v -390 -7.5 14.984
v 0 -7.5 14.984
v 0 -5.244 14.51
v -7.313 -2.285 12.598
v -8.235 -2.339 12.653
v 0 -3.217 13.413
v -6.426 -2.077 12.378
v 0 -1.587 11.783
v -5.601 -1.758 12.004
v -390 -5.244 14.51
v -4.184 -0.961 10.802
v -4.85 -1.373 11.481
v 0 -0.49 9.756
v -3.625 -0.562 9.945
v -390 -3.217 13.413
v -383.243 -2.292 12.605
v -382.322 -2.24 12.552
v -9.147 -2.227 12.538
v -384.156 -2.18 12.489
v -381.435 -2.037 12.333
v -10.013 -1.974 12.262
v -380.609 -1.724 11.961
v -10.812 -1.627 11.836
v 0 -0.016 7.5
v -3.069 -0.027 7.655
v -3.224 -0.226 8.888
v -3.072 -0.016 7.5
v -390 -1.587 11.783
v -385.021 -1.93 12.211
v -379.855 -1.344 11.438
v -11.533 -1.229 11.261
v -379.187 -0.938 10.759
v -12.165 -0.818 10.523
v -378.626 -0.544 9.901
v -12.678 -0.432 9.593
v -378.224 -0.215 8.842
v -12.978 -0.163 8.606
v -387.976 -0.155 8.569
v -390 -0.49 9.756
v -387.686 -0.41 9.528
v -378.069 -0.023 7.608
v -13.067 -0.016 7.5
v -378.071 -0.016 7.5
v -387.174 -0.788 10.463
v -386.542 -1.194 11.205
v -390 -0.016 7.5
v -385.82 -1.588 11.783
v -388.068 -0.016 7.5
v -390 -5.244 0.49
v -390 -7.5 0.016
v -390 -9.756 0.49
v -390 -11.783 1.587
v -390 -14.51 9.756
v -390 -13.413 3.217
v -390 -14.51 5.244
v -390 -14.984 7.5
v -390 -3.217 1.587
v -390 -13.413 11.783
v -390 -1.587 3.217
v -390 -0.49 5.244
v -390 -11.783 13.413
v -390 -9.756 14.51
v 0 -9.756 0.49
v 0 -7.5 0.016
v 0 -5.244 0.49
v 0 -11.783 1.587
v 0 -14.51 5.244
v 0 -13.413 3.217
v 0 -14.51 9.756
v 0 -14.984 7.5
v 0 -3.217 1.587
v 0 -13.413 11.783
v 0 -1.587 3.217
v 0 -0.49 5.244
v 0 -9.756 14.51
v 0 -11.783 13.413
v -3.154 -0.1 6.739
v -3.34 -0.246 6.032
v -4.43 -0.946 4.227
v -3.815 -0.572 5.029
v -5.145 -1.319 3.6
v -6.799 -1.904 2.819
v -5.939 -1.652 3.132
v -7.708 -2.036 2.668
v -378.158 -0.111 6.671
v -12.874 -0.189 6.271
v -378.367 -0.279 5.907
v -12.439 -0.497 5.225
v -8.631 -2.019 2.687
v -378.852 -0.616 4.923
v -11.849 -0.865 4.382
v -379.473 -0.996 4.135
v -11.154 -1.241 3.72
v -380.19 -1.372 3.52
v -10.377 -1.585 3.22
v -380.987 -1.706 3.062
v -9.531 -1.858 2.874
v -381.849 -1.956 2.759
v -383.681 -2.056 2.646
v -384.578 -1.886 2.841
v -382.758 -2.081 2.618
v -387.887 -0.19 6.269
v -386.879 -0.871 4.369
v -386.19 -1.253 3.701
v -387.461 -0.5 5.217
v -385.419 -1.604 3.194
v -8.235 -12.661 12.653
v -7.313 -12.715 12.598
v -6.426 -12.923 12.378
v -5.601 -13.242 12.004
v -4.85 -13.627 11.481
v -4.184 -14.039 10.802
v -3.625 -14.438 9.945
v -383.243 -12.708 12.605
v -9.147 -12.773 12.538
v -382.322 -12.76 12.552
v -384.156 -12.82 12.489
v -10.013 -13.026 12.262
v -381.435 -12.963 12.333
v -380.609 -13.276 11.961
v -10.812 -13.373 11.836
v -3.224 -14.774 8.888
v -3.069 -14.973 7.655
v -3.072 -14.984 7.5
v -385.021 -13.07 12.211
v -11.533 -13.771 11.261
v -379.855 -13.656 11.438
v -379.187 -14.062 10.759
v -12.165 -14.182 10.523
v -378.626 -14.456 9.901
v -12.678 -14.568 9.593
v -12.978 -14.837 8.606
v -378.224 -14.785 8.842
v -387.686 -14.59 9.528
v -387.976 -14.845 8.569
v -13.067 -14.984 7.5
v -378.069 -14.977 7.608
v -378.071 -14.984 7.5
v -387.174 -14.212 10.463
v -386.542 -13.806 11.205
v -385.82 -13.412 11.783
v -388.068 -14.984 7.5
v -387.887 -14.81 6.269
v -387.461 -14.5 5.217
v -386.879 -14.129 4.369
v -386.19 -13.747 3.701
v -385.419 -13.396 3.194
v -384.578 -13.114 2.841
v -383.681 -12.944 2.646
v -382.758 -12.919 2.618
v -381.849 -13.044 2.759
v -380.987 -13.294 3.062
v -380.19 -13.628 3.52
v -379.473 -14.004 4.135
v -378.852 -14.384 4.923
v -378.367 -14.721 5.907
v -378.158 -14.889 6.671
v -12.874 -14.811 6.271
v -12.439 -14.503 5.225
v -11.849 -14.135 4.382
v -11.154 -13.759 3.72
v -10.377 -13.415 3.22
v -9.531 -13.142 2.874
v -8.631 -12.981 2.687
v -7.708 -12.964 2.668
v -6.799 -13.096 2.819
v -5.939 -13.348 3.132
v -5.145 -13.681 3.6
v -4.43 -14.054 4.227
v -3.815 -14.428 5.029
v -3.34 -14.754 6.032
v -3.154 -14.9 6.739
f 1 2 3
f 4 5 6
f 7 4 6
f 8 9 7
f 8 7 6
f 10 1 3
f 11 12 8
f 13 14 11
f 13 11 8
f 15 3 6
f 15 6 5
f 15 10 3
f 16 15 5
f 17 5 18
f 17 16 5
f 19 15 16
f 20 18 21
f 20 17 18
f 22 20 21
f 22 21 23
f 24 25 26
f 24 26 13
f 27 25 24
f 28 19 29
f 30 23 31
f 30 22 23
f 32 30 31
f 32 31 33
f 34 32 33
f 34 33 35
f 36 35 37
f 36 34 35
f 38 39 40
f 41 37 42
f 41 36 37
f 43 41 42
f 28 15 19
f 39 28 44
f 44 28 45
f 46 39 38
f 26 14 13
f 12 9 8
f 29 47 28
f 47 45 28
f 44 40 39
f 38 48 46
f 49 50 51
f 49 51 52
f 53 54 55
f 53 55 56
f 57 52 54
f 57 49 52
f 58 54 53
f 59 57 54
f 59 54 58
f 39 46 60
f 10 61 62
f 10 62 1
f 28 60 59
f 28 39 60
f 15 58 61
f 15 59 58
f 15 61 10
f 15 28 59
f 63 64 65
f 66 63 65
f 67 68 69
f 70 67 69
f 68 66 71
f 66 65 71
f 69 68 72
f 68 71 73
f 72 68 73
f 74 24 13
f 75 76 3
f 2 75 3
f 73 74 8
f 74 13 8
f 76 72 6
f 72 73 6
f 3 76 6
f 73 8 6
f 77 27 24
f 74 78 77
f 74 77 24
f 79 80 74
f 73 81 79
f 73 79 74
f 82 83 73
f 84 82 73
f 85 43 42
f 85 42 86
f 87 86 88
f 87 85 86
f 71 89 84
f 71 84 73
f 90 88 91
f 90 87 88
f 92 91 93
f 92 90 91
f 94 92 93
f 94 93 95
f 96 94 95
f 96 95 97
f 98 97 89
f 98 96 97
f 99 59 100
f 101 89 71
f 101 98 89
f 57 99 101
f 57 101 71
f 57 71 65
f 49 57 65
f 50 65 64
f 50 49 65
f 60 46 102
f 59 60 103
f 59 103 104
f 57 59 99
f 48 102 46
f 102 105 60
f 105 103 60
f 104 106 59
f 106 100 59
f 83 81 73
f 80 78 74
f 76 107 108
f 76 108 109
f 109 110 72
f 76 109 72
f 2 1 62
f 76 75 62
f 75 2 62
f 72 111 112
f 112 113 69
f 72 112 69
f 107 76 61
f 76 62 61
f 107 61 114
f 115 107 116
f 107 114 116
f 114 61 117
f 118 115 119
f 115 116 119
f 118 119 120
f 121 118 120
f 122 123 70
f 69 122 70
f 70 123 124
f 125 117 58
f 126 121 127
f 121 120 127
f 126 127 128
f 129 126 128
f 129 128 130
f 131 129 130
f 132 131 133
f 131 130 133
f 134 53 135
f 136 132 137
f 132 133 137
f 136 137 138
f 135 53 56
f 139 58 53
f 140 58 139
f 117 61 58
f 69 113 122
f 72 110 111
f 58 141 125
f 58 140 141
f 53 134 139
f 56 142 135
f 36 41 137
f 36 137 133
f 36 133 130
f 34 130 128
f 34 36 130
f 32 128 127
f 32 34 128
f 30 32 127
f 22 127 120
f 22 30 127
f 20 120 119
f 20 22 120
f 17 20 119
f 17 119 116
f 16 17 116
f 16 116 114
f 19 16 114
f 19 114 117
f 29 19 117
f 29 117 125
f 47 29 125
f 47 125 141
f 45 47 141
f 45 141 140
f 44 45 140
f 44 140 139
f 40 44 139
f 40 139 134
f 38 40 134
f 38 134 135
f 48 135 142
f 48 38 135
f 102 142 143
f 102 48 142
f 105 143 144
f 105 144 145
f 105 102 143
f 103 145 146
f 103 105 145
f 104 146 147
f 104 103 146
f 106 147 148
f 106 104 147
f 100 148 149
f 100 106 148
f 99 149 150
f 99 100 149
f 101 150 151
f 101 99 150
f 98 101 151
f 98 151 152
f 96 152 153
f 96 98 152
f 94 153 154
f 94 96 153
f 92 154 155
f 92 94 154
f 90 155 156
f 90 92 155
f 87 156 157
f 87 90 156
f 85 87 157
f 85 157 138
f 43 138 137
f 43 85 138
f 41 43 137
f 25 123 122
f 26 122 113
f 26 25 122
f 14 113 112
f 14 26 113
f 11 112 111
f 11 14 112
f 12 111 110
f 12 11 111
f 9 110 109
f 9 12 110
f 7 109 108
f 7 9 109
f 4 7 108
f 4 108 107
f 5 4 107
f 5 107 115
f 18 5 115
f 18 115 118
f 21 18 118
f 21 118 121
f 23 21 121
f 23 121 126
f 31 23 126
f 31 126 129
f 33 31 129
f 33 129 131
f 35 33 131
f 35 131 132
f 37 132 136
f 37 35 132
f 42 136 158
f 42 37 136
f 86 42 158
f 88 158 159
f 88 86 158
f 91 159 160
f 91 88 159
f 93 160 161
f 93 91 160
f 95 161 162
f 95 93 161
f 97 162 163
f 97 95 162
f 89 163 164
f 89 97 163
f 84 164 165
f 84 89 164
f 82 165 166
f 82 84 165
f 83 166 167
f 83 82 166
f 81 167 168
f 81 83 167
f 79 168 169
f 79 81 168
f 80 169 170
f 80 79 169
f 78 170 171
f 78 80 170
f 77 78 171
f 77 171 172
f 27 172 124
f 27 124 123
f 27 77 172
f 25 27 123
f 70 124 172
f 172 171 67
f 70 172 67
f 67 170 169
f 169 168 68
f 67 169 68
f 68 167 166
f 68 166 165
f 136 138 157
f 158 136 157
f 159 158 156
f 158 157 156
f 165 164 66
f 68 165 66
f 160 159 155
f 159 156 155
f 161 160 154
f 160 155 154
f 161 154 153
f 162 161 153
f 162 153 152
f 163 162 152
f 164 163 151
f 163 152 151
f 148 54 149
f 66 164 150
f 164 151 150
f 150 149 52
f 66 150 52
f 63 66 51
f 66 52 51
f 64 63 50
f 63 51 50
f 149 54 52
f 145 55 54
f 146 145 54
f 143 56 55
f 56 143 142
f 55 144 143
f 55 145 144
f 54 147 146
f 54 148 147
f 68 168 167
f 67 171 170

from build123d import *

# Parameters (mm, degrees)
F0_W        = 390
F0_H        = 15
F1_DEPTH    = 15
F2_R        = 5
F3_DEPTH    = 20
F4_T1_DEPTH = 430


# Not quite as in the source:
# - a fillet or chamfer that OpenCascade refuses, or shapes differently, is made with other operations: its cross-section is extruded or revolved along the edge and cut away or added


with BuildPart() as f1:
    # F0 (on Front) → F1 (new body)
    with BuildSketch(Plane.XZ):
        with Locations((-195, 7.5)):
            Rectangle(F0_W, F0_H)
    extrude(amount=F1_DEPTH)

    # F2 (on Front) → F3 (cut)
    with BuildSketch(Plane.XZ):
        with Locations((-383.0693596974, 7.6079843566)):
            Circle(F2_R)
        with Locations((-8.0693596974, 7.6553751715)):
            Circle(F2_R)
    extrude(amount=F3_DEPTH, mode=Mode.SUBTRACT)

    # F4: fillet of radius 8 on 4 edges, made by hand

    # F4_s2 → F4_t1 (cut)
    with BuildSketch(Plane.YZ.offset(-410)):
        with BuildLine():
            ThreePointArc((-8, 15), (-2.3431457505, 12.6568542495), (0, 7))
            Line((0, 7), (0, 15))
            Line((0, 15), (-8, 15))
        make_face()
        with BuildLine():
            ThreePointArc((0, 8), (-2.3431457505, 2.3431457505), (-8, 0))
            Line((-8, 0), (0, 0))
            Line((0, 0), (0, 8))
        make_face()
        with BuildLine():
            ThreePointArc((-7, 15), (-12.6568542495, 12.6568542495), (-15, 7))
            Line((-15, 7), (-15, 15))
            Line((-15, 15), (-7, 15))
        make_face()
        with BuildLine():
            ThreePointArc((-15, 8), (-12.6568542495, 2.3431457505), (-7, 0))
            Line((-7, 0), (-15, 0))
            Line((-15, 0), (-15, 8))
        make_face()
    extrude(amount=F4_T1_DEPTH, mode=Mode.SUBTRACT)


solid = f1.part
